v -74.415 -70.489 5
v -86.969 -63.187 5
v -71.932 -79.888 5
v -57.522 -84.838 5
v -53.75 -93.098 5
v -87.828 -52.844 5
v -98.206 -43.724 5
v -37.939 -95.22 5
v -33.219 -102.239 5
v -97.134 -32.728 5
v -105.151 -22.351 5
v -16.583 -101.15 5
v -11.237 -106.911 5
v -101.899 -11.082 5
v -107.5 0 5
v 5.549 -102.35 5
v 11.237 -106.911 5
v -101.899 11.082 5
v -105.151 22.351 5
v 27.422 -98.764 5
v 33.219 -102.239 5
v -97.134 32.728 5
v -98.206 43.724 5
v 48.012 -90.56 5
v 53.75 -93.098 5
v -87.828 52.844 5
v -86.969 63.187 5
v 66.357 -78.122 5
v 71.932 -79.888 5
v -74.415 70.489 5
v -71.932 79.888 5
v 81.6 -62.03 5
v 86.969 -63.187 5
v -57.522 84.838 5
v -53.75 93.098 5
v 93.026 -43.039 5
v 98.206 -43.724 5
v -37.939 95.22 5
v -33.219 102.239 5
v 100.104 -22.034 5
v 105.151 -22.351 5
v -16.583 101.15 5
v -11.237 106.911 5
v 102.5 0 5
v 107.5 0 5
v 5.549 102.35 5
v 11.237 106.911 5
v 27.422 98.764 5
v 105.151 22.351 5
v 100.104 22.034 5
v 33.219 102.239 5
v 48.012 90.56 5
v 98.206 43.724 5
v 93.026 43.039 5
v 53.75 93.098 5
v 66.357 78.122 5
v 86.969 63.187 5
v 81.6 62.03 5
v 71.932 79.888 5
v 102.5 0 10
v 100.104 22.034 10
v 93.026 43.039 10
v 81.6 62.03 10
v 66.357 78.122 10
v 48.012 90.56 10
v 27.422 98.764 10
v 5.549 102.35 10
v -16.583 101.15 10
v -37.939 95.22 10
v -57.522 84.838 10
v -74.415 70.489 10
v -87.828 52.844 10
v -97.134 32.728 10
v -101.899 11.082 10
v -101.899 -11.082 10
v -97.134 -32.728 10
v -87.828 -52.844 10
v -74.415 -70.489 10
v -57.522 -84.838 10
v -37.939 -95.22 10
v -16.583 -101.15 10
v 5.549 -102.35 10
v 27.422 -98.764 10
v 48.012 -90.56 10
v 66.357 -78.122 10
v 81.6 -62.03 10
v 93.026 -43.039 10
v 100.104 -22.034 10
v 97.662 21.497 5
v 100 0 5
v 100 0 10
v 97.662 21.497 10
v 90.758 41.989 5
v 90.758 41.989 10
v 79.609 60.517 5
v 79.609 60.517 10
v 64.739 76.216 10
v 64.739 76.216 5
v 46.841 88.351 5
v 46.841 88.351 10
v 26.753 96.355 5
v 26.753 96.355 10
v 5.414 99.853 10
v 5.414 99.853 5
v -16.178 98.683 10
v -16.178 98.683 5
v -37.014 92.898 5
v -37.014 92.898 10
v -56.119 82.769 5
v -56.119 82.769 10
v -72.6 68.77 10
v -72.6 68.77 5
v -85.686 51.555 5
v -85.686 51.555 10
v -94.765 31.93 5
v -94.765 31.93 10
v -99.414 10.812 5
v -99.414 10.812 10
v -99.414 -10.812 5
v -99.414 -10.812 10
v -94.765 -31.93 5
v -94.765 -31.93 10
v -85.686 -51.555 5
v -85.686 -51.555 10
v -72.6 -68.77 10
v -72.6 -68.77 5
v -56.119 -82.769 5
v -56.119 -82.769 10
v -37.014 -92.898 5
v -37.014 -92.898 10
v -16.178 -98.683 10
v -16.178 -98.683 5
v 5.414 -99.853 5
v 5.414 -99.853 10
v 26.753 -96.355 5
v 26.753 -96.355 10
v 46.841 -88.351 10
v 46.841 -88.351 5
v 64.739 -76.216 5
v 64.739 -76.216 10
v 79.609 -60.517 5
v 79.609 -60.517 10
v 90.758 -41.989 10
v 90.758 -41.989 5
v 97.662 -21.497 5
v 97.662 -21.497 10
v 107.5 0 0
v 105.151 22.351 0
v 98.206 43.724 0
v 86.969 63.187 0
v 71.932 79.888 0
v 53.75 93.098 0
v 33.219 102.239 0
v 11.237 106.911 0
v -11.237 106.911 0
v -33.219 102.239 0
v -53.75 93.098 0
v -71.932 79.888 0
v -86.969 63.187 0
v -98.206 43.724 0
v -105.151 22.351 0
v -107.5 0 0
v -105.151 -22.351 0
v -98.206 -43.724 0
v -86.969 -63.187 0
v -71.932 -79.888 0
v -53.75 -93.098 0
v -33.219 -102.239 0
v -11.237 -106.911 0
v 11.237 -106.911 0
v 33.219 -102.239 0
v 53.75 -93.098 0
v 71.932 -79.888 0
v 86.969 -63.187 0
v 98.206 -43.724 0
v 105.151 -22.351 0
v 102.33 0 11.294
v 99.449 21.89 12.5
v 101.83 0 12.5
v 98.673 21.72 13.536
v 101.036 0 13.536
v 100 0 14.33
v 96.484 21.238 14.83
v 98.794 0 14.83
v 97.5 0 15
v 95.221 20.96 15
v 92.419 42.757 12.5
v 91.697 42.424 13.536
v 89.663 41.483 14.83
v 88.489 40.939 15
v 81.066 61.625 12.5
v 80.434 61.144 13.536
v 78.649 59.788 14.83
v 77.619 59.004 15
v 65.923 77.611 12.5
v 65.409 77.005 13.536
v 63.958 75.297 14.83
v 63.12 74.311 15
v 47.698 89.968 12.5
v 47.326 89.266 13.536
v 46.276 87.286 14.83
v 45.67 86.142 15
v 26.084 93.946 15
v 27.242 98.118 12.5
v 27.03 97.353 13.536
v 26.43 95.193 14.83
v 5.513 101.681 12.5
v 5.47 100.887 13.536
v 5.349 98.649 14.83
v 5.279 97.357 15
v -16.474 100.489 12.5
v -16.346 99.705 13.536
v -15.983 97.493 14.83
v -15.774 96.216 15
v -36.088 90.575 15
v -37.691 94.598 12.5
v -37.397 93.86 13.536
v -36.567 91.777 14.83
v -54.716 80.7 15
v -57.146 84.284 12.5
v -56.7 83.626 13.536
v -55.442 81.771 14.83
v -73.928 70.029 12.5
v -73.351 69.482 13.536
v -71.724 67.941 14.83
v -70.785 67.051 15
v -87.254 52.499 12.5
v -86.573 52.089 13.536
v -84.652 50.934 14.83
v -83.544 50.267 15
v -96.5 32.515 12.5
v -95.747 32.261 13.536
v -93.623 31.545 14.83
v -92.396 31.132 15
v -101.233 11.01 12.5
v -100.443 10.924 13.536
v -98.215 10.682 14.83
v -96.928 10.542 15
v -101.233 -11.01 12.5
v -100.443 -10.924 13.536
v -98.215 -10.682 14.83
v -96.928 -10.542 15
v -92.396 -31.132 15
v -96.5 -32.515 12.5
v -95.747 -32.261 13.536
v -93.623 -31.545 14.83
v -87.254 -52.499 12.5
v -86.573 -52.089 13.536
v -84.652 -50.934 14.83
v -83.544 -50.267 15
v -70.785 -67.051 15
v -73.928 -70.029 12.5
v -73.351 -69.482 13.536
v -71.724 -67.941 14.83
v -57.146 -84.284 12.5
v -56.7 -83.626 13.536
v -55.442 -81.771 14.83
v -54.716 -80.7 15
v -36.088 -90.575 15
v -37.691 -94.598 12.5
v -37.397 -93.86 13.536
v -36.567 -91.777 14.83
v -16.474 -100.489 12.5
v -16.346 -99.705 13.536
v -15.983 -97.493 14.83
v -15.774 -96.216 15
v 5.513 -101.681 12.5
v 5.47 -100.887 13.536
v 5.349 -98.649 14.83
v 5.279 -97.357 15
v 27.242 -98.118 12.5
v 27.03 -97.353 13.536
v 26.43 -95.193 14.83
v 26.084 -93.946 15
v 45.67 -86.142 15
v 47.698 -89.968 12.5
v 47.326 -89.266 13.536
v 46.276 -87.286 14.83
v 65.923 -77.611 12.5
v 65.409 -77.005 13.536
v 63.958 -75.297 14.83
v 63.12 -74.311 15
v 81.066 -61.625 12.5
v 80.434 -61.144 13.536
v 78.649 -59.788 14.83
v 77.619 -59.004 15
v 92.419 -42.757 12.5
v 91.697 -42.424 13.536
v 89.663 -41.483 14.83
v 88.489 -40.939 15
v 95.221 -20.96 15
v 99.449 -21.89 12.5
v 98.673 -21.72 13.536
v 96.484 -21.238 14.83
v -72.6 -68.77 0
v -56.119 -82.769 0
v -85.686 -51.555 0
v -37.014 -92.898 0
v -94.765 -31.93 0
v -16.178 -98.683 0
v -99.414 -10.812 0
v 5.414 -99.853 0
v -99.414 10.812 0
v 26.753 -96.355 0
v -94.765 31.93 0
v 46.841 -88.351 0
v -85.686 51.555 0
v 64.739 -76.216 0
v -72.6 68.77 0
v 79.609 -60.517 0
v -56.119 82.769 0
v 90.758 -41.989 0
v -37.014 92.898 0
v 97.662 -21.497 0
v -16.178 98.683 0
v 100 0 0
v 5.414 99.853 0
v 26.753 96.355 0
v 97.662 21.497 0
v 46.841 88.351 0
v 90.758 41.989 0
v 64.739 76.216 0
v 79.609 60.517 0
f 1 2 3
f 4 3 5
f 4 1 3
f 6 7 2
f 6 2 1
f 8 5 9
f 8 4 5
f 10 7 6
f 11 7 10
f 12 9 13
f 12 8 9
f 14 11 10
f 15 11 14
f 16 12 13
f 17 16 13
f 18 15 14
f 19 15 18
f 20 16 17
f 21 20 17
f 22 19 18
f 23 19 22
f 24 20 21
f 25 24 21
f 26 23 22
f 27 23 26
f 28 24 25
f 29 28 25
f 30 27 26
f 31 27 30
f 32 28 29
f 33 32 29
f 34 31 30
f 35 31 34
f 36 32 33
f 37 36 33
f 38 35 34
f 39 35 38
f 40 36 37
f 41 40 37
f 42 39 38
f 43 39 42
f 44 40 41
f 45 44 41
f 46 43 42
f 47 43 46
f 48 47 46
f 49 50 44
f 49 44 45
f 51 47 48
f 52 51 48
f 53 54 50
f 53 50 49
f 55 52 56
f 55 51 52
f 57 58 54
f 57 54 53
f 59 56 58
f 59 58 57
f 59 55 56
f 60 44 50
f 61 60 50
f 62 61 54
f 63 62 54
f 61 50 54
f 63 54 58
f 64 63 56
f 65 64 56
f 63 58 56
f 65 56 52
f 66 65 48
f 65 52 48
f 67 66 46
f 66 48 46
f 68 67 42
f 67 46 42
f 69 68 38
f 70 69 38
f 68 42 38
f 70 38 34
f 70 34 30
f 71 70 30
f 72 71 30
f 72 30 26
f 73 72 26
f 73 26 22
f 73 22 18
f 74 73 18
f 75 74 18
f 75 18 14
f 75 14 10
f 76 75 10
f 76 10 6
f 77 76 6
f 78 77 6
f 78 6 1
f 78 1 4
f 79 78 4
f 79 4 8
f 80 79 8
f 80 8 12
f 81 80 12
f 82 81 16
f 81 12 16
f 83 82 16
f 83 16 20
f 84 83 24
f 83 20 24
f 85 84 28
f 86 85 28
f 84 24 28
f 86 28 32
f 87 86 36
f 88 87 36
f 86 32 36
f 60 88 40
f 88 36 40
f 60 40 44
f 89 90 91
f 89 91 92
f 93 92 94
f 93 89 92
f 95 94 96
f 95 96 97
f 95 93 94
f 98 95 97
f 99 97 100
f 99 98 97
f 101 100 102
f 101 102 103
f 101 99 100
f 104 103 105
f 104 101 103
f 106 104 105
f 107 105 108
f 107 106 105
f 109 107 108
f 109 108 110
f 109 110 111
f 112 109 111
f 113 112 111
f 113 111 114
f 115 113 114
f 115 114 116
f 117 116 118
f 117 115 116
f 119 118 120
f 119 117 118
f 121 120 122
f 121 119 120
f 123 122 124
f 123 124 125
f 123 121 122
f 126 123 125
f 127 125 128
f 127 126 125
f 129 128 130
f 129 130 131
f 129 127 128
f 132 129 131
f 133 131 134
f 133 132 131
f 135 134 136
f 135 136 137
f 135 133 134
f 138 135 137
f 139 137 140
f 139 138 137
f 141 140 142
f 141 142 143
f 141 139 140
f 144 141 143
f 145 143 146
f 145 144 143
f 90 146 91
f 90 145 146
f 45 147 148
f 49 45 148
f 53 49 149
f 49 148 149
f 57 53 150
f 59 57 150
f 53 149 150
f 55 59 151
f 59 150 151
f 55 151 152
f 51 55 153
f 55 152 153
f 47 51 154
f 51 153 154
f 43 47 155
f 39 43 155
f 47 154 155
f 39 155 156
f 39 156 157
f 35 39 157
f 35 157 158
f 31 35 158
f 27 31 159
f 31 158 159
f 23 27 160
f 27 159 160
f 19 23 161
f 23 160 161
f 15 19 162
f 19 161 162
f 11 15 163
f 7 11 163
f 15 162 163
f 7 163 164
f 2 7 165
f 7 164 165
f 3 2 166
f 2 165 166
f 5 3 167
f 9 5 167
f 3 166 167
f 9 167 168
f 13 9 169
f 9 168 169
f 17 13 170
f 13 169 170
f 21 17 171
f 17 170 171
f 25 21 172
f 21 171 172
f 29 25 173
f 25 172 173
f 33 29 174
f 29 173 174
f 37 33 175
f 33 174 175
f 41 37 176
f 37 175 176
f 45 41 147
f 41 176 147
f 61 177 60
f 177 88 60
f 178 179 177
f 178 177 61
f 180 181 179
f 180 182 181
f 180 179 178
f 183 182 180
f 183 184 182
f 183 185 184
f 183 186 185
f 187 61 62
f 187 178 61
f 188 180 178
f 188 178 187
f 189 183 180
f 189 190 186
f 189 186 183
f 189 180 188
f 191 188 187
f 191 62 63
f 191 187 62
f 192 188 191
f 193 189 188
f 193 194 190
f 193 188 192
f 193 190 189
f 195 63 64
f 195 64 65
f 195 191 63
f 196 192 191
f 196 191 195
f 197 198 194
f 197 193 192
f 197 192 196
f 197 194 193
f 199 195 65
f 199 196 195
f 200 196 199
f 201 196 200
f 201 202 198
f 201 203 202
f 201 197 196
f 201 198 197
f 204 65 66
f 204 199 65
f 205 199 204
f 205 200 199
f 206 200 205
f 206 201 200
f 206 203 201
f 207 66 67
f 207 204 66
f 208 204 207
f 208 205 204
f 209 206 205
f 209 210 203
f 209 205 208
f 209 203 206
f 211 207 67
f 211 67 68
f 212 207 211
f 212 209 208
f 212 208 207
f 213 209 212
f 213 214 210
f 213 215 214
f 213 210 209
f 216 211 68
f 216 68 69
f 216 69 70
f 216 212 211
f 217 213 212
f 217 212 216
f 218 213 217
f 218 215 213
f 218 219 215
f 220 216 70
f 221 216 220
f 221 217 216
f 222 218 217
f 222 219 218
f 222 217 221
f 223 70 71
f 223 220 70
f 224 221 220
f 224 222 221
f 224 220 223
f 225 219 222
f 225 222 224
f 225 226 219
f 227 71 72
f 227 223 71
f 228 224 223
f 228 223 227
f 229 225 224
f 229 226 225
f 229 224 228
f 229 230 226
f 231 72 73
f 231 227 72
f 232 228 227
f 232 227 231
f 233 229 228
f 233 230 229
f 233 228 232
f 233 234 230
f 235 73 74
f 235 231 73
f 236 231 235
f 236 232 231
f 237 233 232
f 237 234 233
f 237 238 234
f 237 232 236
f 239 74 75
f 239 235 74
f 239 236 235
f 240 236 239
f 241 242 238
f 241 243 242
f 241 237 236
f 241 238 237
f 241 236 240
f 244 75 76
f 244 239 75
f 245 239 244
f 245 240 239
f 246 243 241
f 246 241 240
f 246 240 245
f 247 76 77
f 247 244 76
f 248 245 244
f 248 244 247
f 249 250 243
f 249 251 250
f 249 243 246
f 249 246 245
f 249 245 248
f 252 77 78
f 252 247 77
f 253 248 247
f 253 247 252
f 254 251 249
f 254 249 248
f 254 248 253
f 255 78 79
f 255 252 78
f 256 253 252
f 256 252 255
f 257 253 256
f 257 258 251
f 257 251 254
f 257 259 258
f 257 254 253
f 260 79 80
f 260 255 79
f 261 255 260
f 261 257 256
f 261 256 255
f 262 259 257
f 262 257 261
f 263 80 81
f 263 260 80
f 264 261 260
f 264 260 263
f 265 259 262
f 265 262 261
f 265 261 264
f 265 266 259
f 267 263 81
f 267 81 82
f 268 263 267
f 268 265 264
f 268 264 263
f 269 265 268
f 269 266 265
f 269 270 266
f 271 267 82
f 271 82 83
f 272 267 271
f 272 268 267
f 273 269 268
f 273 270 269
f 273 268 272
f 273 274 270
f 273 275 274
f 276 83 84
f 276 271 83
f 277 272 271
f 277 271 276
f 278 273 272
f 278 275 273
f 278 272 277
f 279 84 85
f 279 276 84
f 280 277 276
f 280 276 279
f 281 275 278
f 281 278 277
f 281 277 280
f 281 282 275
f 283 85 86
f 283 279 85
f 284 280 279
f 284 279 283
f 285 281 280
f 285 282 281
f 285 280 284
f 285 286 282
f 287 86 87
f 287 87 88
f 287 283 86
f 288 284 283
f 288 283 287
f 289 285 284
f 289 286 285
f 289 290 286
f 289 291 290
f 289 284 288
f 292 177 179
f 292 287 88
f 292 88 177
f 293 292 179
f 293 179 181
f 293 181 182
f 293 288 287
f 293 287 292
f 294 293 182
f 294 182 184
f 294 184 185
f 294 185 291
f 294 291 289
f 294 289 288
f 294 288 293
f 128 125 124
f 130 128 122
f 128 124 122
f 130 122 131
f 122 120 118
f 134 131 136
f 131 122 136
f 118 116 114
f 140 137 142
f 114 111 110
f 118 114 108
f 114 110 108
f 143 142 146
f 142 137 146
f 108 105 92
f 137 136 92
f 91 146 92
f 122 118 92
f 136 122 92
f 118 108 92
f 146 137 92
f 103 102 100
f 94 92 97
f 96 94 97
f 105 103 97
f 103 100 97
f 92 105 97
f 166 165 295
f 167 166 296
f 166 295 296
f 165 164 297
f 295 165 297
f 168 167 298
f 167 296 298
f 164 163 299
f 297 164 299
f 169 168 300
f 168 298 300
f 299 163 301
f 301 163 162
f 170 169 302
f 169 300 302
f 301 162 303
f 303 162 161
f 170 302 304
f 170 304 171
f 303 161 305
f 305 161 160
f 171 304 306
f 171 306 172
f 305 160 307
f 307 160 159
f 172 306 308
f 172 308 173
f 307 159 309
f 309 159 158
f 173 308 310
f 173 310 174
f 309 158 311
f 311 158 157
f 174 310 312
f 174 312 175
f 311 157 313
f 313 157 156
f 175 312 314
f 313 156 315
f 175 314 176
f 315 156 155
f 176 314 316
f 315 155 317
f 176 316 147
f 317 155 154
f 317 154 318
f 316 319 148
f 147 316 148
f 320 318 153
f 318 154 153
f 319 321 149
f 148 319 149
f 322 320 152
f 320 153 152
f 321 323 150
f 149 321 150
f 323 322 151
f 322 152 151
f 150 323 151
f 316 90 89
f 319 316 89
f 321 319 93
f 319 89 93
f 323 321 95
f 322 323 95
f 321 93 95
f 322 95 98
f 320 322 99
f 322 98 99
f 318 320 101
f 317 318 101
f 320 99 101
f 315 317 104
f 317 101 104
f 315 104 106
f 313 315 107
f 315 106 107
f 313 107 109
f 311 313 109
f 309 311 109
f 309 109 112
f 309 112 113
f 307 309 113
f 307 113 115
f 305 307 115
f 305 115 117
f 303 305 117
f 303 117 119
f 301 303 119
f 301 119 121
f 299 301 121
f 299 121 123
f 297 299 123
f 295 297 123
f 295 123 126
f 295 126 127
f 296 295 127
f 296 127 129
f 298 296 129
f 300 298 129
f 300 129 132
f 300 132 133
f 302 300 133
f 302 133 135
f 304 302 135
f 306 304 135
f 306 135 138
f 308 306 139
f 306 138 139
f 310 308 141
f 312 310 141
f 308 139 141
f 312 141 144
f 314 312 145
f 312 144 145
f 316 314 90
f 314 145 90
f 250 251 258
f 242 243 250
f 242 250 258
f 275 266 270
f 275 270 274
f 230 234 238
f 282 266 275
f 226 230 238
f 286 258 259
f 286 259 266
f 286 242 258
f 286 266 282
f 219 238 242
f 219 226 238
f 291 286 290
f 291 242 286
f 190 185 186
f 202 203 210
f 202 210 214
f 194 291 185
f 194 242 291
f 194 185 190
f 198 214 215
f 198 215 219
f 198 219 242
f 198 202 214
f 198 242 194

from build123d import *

# Parameters (mm, degrees)
F0_R     = 107.5
F1_DEPTH = 5
F2_R     = 100
F3_DEPTH = 6
F4_R     = 102.5
F4_R_2   = 100
F5_DEPTH = 5
F6_R     = 102.5
F7_DEPTH = 5
F8_R     = 4.99999


# Not quite as in the source:
# - a fillet or chamfer is up to 0.001 mm smaller than in the source, because OpenCascade refuses the exact size


with BuildPart() as f1:
    # F0 (on Top) → F1 (new body)
    with BuildSketch(Plane.XY):
        Circle(F0_R)
    extrude(amount=F1_DEPTH)

    # F2 (on face) → F3 (cut)
    with BuildSketch(Plane.XY.offset(5)):
        Circle(F2_R)
    extrude(amount=-F3_DEPTH, mode=Mode.SUBTRACT)

    # F4 (on face) → F5 (join)
    with BuildSketch(Plane.XY.offset(5)):
        Circle(F4_R)
        Circle(F4_R_2, mode=Mode.SUBTRACT)
    extrude(amount=F5_DEPTH)

    # F6 (on face) → F7 (join)
    with BuildSketch(Plane.XY.offset(10)):
        Circle(F6_R)
    extrude(amount=F7_DEPTH)

    # F8 (radius 5 in the source; OpenCascade refuses exactly that, so slightly less here)
    f8_edges = [f1.edges().sort_by_distance(p)[0] for p in [
        (-102.5, 0, 15),
    ]]
    fillet(f8_edges, radius=F8_R)


solid = f1.part
